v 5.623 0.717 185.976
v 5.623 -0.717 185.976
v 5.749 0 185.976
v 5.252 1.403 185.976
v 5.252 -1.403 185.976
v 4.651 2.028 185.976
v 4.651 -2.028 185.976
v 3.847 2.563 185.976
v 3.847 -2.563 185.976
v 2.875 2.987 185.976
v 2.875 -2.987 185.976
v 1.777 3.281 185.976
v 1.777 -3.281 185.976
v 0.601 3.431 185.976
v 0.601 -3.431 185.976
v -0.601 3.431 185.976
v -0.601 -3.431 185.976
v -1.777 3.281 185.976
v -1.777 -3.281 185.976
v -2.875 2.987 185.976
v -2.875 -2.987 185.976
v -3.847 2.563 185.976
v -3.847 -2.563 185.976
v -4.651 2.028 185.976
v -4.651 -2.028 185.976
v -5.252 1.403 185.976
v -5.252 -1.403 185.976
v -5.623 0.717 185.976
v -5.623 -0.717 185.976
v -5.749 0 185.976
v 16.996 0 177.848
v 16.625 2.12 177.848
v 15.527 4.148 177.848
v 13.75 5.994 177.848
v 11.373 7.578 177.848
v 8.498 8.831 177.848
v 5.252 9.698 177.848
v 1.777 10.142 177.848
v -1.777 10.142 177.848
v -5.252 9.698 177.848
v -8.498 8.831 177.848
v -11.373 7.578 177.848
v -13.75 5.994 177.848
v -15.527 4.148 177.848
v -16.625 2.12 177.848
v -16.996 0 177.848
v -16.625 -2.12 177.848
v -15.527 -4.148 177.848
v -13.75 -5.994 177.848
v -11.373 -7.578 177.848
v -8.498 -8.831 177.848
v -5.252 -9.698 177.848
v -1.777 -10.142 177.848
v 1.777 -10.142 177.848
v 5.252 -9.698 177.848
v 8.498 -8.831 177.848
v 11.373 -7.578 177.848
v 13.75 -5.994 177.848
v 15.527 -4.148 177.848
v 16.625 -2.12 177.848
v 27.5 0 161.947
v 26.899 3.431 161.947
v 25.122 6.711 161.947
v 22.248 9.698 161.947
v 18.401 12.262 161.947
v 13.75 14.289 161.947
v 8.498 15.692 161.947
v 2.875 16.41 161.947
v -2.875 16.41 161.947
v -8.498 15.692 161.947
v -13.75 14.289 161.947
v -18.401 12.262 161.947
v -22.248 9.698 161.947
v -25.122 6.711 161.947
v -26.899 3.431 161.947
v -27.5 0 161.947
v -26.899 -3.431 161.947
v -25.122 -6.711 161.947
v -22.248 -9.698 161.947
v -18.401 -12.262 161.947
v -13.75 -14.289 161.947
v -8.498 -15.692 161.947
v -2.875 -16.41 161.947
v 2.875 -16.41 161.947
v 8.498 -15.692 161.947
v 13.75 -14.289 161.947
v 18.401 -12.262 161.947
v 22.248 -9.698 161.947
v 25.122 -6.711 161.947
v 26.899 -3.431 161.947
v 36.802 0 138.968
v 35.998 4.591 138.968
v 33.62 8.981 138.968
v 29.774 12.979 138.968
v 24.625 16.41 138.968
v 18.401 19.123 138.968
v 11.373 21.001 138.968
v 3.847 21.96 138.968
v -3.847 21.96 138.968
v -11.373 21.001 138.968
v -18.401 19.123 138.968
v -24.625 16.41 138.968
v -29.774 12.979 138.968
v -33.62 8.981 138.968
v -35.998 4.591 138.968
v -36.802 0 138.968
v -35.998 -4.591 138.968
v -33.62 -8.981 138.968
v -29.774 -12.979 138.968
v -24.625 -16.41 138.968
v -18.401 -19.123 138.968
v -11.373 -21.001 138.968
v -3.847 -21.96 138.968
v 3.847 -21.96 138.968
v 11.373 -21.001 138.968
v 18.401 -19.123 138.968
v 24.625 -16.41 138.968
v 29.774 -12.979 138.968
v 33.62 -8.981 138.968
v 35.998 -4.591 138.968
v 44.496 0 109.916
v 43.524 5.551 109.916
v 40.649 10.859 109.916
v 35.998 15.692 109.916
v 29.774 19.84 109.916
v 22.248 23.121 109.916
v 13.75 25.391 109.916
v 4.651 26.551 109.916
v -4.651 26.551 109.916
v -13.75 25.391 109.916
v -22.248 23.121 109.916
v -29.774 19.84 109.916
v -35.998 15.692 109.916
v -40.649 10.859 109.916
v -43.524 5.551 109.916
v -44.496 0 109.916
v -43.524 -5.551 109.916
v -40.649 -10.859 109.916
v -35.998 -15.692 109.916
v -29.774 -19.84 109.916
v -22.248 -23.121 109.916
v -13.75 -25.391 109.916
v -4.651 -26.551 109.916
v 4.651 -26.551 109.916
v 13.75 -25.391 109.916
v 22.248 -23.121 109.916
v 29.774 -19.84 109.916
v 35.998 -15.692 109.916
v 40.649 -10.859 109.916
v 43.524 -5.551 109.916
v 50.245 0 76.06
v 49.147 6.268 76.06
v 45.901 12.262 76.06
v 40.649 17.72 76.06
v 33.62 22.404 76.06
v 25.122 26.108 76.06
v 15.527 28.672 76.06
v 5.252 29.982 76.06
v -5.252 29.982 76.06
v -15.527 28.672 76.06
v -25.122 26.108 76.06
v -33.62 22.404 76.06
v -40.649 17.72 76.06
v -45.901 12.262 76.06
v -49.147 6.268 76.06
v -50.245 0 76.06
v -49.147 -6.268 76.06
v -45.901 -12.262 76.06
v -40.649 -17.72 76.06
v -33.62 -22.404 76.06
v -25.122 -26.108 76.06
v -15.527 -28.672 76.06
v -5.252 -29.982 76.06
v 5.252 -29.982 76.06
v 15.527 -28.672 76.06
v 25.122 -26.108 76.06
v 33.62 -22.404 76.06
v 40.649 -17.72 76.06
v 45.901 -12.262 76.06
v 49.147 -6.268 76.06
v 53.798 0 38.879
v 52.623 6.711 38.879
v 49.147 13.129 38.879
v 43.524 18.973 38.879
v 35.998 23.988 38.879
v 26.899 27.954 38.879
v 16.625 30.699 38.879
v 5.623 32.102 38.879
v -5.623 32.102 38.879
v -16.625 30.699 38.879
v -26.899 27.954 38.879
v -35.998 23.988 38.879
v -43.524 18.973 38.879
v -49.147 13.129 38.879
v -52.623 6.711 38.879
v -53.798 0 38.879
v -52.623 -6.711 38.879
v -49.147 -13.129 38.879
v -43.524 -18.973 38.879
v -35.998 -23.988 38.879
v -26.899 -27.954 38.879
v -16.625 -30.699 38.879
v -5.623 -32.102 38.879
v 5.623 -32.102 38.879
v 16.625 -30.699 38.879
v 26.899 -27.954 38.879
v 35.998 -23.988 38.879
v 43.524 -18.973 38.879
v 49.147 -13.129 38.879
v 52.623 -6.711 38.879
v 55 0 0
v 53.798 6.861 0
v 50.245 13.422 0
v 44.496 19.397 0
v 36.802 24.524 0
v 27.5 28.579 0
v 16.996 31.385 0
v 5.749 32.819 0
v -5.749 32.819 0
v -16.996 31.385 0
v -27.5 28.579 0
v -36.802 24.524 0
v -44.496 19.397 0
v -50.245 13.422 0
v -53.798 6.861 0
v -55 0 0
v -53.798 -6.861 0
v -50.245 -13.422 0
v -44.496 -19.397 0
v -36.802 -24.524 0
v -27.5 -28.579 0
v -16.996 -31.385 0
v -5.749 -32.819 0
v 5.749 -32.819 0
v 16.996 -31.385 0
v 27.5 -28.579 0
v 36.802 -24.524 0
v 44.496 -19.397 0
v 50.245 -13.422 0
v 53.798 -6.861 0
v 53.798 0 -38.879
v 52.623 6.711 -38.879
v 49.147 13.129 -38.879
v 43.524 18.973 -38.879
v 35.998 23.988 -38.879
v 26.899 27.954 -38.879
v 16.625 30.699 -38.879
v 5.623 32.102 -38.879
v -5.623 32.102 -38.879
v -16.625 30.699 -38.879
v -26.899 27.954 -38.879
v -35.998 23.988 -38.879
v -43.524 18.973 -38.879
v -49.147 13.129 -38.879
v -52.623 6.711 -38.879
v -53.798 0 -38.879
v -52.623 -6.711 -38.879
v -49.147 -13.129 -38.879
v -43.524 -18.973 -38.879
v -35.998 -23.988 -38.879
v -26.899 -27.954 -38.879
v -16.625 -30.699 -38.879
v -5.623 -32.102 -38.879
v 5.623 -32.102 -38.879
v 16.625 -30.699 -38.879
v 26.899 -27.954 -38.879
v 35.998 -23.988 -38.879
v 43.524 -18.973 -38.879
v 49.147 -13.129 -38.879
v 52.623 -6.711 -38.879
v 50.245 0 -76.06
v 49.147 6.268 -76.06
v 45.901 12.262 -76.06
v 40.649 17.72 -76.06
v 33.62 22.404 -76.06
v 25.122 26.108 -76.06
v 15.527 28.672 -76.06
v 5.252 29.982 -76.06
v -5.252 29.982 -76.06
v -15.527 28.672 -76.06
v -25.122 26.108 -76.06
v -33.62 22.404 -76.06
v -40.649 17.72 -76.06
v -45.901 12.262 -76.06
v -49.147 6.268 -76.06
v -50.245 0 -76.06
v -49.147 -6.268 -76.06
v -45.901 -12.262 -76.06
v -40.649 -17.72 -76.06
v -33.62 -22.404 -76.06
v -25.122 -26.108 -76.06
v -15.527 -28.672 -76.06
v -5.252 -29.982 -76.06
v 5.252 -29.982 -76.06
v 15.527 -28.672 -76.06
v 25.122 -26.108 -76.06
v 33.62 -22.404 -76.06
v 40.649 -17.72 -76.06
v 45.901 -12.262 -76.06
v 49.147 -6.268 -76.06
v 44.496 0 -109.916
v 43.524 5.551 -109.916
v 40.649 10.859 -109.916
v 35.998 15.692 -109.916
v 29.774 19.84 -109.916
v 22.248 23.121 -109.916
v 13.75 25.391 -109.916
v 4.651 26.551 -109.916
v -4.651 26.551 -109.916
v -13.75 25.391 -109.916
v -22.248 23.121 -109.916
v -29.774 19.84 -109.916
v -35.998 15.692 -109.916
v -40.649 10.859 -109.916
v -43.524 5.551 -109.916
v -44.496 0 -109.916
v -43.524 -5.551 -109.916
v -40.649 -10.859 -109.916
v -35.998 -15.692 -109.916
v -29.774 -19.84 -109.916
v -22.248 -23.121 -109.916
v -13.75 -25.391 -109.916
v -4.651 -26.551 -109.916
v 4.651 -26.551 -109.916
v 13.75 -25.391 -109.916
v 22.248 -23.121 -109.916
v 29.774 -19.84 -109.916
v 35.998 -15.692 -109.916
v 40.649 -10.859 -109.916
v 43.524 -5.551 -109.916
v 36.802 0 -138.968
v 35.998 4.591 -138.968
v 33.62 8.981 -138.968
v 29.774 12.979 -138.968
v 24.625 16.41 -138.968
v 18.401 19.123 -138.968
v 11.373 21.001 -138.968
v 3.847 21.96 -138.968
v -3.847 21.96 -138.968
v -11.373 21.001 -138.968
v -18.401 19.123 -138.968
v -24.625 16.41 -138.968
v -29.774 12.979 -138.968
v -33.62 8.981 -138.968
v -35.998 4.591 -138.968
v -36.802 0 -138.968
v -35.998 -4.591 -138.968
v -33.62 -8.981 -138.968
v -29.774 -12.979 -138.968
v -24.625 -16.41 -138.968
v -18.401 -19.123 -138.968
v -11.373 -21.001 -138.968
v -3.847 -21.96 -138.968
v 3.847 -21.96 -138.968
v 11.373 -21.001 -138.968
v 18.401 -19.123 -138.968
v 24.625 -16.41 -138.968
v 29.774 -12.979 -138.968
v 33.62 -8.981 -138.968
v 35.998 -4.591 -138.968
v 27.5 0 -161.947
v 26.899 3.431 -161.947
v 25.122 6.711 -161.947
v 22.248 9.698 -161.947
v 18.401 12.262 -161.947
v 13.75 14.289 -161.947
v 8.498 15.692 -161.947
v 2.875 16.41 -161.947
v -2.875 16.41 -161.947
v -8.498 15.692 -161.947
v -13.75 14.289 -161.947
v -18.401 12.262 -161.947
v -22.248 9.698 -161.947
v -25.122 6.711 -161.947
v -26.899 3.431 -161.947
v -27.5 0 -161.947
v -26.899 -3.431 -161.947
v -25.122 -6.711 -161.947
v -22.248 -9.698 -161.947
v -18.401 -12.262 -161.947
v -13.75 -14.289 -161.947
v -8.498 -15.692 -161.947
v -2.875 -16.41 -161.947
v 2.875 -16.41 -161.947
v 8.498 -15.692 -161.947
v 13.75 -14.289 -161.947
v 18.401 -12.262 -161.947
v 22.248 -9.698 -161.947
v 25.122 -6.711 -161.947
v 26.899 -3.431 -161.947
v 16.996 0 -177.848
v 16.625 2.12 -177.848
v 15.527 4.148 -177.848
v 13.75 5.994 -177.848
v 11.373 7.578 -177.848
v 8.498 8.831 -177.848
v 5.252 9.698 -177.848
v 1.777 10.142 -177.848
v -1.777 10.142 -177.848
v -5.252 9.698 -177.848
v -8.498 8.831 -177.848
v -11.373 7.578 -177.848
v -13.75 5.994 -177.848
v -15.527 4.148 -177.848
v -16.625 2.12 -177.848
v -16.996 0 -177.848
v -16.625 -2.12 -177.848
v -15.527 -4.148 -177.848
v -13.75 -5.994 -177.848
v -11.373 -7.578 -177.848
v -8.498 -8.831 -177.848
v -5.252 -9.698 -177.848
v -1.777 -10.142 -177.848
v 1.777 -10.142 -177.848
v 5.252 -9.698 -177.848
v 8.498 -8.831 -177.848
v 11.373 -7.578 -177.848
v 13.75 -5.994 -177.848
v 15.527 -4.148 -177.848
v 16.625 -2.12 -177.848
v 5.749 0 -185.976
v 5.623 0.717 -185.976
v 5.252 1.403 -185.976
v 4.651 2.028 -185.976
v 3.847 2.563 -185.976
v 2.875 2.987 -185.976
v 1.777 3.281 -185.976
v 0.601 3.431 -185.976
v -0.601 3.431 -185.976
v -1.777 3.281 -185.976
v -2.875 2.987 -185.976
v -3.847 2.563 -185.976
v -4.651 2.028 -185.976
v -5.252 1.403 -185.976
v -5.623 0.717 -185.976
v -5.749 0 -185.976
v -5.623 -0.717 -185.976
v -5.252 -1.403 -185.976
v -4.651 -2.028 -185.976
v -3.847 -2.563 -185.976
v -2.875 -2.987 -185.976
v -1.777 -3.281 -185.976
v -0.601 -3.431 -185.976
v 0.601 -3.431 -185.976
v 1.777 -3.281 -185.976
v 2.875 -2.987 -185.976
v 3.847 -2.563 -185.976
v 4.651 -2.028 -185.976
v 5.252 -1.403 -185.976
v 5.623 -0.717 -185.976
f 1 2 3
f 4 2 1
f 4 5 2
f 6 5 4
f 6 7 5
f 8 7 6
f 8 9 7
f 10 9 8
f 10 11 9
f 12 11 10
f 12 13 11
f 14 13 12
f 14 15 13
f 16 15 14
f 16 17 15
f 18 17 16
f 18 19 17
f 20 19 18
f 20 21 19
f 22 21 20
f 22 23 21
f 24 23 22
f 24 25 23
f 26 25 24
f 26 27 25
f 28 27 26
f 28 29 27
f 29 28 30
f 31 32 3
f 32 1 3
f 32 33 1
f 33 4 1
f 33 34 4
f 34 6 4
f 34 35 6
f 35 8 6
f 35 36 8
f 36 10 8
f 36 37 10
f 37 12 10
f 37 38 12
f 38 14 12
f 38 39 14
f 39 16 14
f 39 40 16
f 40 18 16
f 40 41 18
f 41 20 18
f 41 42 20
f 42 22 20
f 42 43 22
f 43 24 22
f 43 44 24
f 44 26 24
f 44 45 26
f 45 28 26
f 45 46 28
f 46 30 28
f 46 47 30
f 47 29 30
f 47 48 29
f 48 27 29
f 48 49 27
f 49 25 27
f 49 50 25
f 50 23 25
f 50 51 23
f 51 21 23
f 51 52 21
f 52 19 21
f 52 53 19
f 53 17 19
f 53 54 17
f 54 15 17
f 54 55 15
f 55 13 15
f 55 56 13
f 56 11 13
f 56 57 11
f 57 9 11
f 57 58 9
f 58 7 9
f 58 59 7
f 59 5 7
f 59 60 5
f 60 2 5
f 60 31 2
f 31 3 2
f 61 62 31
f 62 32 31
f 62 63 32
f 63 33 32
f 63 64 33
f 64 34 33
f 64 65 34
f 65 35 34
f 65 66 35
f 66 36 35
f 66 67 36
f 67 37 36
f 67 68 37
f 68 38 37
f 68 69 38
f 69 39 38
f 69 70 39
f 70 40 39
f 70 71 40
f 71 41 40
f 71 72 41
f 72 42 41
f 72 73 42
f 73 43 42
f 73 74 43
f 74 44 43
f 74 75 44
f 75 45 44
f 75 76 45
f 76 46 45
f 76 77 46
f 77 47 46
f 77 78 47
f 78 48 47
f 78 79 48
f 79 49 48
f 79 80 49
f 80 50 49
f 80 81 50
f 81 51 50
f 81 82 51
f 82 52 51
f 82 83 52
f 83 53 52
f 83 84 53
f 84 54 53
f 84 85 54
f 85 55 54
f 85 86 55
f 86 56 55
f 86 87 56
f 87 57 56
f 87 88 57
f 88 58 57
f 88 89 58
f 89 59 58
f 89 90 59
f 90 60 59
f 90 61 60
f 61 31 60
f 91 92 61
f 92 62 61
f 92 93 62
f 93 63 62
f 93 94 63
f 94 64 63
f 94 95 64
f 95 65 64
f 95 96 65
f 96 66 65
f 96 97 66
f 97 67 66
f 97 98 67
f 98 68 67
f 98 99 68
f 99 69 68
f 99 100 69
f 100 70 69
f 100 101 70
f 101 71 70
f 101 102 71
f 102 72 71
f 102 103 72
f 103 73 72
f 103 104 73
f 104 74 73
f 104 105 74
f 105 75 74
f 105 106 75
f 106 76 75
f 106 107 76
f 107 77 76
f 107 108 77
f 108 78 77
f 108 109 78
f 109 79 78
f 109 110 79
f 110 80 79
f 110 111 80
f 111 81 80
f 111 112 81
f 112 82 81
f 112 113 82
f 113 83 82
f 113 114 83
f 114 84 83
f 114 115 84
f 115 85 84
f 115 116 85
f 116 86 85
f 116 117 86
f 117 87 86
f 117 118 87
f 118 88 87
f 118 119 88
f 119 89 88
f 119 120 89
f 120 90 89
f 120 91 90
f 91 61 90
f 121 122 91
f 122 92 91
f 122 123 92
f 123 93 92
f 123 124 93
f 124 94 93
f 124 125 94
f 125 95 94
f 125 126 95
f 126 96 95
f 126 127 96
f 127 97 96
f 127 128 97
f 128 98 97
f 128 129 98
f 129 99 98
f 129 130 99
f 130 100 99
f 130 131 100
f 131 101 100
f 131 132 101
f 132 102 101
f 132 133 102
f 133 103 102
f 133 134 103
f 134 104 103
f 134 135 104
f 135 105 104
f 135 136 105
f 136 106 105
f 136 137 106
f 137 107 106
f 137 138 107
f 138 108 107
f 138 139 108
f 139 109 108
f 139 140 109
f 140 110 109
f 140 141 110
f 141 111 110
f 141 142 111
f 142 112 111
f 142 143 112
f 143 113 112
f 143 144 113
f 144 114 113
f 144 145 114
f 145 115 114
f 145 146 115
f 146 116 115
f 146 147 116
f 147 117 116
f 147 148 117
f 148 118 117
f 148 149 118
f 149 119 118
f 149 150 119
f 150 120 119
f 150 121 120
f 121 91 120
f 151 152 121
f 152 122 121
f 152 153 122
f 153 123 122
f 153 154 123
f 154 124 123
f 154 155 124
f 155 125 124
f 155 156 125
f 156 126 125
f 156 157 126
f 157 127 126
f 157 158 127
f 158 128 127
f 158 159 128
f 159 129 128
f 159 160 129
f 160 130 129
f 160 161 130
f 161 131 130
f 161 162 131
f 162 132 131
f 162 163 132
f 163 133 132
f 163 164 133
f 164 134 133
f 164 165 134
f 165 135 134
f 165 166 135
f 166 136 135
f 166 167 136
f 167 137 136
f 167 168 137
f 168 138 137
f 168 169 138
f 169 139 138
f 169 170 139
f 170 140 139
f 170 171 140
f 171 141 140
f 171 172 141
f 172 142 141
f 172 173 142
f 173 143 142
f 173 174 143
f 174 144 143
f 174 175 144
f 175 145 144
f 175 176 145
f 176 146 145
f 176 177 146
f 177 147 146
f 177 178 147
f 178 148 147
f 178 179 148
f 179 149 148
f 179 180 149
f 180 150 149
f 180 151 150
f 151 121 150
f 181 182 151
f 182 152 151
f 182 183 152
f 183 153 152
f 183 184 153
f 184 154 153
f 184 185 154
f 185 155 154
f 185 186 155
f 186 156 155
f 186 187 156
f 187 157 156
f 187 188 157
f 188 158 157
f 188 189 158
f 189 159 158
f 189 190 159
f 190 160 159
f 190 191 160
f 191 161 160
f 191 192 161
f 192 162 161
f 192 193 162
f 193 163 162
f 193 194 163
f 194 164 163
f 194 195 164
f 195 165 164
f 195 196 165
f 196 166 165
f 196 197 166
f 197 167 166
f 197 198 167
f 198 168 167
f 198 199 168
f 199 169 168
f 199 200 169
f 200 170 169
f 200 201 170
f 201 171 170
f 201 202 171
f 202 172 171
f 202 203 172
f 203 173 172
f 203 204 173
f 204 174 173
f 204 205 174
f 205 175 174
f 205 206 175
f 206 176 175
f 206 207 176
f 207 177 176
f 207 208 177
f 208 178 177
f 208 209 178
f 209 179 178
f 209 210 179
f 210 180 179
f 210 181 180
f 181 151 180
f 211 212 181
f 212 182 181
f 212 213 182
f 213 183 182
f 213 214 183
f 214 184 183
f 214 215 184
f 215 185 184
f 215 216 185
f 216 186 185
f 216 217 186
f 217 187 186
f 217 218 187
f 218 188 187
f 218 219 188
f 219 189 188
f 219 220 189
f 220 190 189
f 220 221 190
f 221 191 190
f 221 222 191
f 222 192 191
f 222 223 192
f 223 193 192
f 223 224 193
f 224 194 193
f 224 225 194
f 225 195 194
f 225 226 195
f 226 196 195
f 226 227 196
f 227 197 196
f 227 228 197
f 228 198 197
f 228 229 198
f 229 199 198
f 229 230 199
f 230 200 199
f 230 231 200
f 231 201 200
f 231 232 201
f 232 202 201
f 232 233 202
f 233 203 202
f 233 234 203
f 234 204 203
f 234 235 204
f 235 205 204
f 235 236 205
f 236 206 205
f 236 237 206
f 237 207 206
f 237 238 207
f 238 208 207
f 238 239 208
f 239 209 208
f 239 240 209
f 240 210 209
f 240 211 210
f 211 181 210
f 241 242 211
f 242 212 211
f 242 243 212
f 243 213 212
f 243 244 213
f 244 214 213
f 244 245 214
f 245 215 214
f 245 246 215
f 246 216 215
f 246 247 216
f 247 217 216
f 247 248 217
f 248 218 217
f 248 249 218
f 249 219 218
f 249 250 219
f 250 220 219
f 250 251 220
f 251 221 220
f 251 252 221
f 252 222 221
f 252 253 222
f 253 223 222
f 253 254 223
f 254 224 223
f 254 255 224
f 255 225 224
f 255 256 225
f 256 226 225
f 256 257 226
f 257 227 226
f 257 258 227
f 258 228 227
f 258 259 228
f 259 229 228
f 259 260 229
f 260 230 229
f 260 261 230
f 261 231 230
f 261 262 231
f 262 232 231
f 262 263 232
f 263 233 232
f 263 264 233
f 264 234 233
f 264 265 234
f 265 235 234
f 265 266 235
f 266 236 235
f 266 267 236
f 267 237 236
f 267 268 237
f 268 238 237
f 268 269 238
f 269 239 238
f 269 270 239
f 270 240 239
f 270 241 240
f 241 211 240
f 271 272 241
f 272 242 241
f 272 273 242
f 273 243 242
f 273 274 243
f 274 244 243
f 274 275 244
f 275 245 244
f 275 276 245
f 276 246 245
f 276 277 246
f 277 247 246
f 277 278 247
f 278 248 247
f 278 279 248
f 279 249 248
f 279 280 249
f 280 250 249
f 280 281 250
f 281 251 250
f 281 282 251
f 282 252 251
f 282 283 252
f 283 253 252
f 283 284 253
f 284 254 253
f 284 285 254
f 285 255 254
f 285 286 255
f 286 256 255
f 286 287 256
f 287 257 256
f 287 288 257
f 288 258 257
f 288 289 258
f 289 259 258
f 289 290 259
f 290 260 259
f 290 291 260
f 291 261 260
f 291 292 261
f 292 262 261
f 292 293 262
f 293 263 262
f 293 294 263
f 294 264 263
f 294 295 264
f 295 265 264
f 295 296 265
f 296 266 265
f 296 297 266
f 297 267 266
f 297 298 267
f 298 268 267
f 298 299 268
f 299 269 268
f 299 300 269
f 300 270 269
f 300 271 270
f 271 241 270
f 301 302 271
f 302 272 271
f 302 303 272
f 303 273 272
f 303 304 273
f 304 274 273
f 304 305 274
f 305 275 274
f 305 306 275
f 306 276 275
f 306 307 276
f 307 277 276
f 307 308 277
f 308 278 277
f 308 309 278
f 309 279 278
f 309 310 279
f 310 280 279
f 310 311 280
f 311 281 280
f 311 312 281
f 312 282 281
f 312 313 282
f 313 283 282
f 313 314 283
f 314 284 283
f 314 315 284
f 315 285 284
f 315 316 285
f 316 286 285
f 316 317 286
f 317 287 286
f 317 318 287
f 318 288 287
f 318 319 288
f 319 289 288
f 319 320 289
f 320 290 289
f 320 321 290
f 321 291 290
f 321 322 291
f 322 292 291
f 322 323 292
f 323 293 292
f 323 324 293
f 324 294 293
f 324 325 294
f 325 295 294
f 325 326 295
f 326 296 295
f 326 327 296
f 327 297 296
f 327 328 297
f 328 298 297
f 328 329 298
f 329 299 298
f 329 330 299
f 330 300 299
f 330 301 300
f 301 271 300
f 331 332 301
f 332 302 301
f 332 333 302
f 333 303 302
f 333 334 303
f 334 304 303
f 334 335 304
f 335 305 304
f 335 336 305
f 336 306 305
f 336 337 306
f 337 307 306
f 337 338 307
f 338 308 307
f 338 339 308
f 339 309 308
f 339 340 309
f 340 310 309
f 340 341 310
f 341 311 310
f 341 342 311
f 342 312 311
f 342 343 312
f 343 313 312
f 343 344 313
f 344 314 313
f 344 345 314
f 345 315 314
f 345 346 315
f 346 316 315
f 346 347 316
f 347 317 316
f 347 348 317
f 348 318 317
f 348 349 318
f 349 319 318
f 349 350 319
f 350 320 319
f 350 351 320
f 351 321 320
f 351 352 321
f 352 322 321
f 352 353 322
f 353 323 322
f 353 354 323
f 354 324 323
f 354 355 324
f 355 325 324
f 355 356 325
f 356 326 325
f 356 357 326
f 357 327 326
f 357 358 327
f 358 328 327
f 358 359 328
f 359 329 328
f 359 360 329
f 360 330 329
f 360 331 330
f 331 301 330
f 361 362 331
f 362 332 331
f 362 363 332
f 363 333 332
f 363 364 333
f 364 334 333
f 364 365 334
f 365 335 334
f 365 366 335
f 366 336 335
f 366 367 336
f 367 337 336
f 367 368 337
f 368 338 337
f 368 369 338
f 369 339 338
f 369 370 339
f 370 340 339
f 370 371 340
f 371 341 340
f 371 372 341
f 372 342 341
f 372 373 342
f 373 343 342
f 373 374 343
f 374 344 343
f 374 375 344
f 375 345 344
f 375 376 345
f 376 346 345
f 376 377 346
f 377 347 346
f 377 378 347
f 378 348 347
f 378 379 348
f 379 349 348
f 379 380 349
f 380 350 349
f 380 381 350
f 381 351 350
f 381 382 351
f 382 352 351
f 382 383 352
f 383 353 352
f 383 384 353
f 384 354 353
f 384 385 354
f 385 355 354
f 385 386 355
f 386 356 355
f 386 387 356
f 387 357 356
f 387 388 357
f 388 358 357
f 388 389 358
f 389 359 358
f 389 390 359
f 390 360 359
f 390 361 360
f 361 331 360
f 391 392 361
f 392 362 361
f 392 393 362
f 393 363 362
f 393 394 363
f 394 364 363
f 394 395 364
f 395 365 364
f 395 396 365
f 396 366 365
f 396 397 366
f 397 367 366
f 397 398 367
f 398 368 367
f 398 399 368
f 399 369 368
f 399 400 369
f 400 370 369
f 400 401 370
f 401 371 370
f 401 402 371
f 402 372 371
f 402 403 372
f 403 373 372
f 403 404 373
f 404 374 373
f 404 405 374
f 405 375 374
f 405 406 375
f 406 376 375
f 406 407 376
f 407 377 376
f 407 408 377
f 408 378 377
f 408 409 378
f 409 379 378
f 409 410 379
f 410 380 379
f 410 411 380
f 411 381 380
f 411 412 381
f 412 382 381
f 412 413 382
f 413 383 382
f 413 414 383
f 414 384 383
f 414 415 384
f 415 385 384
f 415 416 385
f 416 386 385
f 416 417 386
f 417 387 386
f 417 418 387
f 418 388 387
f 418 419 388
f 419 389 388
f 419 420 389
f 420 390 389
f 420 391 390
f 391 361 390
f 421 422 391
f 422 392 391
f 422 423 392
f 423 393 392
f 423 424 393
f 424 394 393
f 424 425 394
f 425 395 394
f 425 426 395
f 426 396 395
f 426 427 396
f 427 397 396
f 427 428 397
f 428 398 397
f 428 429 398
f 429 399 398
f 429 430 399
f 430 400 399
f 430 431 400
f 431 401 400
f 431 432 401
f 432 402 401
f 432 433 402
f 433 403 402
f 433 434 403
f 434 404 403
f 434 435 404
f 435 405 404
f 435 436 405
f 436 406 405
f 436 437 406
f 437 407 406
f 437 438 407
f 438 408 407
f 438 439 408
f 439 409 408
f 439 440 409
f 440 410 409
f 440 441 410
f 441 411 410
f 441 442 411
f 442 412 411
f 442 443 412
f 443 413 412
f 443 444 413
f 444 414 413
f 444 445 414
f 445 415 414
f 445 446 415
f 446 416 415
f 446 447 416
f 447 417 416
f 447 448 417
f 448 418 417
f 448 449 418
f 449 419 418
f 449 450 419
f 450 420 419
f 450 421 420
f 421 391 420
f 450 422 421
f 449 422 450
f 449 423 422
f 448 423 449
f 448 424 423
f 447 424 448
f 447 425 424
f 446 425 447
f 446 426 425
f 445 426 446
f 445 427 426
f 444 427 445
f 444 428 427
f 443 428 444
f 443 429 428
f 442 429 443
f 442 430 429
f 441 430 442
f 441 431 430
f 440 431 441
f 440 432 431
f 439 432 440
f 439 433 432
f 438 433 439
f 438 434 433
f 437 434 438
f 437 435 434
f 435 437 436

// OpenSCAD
// Generated by SolidPython 1.0.1 on 2020-07-29 00:46:46


scale(v = [5, 3, 17]) {
	sphere(r = 11);
}
/***********************************************
*********      SolidPython code:      **********
************************************************
 
# import packages: SolidPython
from solid import *
from solid.utils import *
from itertools import chain, combinations, permutations


class Resize:

    def __init__(self, scad_file):
        self.scad_file = scad_file
        #self.scad_file = import_scad(scad_file)
        # cone/cylinder param:
        self.r1 = 0
        self.r2 = 0
        self.h = 0
        # rectangular prism param:
        self.w = 0
        self.l = 0
        # ellipse param:
        self.r = 0

    # import OpenScad code (file name corresponds to shape)


    # classify shape + parameters
    def assign(self, param1, param2, param3):
        if self.scad_file == 'cone.scad':
            self.r1 = param1
            self.r2 = param2
            self.h = param3
        elif self.scad_file == 'cylinder.scad':
            self.r1 = param1
            self.r2 = param2
            self.h = param3
        elif self.scad_file == 'rectangularPrism.scad':
            self.h = param1
            self.l = param2
            self.w = param3
        else:
            self.r = param1
            self.h = param2

    # resize parameters
    def iterate(self):
        x = range(3, 20, 2)
        i = 1
        if self.scad_file == 'cone.scad':
            tempList = list(permutations(x, 2))
            for temp in tempList:
                param1 = temp[0]
                param2 = temp[1]
                filepath = 'produced_scad_files/' + 'cone' + str(param1) + '_' + str(param2) + '_' + '.scad'
                scad_render_to_file(cylinder(h=param1, r1=param2, r2=0), filepath)

        elif self.scad_file == 'cylinder.scad':
            tempList = list(permutations(x, 3))
            for temp in tempList:
                param1 = temp[0]
                param2 = temp[1]
                filepath = 'produced_scad_files/' + 'cylinder' + str(param1) + '_' + str(param2) + '_' + '.scad'
                scad_render_to_file(cylinder(h=param1, r1=param2, r2=param2), filepath)

        elif self.scad_file == 'rectangularPrism.scad':
            tempList = list(permutations(x, 3))
            for temp in tempList:
                param1 = temp[0]
                param2 = temp[1]
                param3 = temp[2]
                filepath = 'produced_scad_files/' + 'rectangularPrism' + str(param1) + '_' + str(param2) + '_' + str(
                    param3) + '.scad'
                scad_render_to_file(cube(size=(param1, param2, param3)), filepath)

        elif self.scad_file == 'ellipse.scad':
            tempList = list(permutations(x, 4))
            for temp in tempList:
                param1 = temp[0]
                param2 = temp[1]
                param3 = temp[2]
                param4 = temp[3]
                filepath = 'produced_scad_files/' + 'ellipse' + str(param1) + '_' + str(param2) + '_' + str(param3) + '_' + str(param4) + '.scad'
                scad_render_to_file(scale([param1, param2, param3])(sphere(r=param4)), filepath)

    def render_to_scadfile(self):
        scad_render_to_file(scad, 'example.scad') 
 
************************************************/
